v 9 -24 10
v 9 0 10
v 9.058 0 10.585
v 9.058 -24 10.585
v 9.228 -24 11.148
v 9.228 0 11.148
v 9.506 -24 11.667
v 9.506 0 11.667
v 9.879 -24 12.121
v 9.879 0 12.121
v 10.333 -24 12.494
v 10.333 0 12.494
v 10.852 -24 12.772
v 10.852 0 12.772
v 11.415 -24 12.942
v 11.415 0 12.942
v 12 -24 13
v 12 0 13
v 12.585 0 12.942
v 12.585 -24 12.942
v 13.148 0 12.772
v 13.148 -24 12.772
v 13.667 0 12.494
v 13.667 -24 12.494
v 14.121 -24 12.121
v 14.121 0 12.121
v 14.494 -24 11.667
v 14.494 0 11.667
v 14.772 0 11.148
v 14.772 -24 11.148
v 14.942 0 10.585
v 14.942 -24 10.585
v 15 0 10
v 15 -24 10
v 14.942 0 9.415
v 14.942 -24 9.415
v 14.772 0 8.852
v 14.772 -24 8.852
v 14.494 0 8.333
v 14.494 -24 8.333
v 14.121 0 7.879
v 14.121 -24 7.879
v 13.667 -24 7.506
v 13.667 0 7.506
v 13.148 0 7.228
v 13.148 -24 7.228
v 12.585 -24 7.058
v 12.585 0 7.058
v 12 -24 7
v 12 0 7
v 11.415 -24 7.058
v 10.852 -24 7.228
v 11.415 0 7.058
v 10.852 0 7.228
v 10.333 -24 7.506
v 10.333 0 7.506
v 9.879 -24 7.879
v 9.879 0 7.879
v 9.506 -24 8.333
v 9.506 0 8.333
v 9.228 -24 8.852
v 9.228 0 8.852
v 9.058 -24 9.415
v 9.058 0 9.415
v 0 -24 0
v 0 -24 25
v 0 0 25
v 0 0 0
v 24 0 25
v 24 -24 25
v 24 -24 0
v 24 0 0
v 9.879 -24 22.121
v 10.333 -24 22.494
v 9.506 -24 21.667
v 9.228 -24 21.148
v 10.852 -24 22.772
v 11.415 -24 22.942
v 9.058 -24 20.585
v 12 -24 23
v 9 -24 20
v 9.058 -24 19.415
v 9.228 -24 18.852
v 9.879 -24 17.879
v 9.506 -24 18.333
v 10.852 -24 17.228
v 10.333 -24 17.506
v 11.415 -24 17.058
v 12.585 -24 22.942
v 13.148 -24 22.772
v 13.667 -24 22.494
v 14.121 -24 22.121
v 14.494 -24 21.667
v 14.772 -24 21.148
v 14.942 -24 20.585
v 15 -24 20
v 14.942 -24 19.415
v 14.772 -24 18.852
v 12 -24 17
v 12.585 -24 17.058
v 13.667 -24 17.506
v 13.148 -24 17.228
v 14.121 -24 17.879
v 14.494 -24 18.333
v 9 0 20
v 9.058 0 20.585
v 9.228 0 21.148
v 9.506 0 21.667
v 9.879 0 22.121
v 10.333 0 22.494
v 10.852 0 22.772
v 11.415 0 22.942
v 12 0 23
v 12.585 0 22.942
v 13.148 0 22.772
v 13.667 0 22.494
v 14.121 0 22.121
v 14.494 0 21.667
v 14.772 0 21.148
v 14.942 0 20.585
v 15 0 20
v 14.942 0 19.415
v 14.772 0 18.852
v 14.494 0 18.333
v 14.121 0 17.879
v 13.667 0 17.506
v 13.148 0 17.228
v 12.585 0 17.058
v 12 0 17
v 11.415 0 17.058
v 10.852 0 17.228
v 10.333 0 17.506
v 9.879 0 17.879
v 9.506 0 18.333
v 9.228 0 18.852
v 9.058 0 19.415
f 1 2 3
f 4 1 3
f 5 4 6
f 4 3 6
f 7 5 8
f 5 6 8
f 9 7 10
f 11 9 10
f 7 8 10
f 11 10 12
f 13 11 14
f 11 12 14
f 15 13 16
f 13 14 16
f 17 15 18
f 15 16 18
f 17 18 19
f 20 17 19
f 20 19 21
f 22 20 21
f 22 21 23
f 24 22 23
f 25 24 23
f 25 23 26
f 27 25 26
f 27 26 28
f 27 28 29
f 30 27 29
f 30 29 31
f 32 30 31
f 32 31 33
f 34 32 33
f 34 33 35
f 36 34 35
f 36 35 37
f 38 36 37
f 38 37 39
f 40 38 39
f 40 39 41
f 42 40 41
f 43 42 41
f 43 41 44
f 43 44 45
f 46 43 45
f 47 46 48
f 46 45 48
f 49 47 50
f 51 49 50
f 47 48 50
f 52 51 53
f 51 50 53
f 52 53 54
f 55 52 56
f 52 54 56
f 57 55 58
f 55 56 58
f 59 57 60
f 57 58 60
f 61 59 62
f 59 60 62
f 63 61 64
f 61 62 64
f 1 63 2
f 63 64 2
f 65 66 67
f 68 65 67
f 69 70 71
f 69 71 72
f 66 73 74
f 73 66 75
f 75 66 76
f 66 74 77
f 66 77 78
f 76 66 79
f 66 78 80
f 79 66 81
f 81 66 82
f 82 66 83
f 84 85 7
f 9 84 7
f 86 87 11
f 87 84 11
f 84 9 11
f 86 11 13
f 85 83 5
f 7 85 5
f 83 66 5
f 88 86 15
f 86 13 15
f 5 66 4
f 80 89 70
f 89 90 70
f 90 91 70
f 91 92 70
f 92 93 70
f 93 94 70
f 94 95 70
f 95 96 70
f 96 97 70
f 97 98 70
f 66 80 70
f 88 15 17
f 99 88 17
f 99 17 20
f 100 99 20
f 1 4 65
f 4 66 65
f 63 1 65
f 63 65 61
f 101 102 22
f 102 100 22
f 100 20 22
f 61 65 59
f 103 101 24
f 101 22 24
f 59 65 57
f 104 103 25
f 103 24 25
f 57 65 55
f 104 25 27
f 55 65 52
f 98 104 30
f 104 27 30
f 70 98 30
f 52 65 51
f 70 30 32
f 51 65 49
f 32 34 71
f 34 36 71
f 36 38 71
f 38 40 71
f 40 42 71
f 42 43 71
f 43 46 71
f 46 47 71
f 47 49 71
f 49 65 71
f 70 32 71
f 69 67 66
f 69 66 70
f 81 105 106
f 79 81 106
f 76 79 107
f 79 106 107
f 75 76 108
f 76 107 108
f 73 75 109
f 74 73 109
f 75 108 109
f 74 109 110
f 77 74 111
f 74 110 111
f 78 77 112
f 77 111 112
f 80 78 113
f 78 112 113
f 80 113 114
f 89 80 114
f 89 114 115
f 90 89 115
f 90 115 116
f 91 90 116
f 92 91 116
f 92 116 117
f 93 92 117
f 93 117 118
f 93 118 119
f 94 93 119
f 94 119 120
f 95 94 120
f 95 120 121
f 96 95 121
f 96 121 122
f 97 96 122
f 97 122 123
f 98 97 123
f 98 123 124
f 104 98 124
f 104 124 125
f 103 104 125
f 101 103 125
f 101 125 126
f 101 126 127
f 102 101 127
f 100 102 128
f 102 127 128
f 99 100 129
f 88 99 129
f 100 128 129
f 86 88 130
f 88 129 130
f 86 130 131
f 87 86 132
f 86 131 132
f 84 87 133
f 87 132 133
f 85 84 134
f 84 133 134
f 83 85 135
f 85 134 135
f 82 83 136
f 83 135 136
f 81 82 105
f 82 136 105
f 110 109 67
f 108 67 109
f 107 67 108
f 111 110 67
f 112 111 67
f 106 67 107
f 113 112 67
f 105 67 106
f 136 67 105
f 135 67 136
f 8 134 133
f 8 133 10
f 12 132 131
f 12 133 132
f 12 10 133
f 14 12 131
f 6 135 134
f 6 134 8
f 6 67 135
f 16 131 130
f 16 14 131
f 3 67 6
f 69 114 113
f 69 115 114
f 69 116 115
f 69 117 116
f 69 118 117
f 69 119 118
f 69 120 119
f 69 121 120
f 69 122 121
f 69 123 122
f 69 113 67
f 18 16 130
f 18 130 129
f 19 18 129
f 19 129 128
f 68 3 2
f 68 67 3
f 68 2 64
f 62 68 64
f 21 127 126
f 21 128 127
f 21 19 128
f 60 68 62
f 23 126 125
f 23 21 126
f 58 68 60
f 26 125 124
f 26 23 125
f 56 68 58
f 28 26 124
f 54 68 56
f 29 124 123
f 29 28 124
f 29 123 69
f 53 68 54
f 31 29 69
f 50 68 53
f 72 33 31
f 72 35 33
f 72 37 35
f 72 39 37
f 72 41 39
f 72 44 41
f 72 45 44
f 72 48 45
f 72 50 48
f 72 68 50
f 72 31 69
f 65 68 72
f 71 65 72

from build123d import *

# Parameters (mm, degrees)
F0_W     = 24
F0_H     = 24
F1_DEPTH = 25
F3_D     = 6


with BuildPart() as f1:
    # F0 (on Top) → F1 (new body)
    with BuildSketch(Plane.XY):
        with Locations((12, -12)):
            Rectangle(F0_W, F0_H)
    extrude(amount=F1_DEPTH)

    # F3 (through all)
    with Locations(Plane.XZ.offset(24)):
        with Locations((12, 20), (12, 10)):
            Hole(F3_D / 2)


solid = f1.part
